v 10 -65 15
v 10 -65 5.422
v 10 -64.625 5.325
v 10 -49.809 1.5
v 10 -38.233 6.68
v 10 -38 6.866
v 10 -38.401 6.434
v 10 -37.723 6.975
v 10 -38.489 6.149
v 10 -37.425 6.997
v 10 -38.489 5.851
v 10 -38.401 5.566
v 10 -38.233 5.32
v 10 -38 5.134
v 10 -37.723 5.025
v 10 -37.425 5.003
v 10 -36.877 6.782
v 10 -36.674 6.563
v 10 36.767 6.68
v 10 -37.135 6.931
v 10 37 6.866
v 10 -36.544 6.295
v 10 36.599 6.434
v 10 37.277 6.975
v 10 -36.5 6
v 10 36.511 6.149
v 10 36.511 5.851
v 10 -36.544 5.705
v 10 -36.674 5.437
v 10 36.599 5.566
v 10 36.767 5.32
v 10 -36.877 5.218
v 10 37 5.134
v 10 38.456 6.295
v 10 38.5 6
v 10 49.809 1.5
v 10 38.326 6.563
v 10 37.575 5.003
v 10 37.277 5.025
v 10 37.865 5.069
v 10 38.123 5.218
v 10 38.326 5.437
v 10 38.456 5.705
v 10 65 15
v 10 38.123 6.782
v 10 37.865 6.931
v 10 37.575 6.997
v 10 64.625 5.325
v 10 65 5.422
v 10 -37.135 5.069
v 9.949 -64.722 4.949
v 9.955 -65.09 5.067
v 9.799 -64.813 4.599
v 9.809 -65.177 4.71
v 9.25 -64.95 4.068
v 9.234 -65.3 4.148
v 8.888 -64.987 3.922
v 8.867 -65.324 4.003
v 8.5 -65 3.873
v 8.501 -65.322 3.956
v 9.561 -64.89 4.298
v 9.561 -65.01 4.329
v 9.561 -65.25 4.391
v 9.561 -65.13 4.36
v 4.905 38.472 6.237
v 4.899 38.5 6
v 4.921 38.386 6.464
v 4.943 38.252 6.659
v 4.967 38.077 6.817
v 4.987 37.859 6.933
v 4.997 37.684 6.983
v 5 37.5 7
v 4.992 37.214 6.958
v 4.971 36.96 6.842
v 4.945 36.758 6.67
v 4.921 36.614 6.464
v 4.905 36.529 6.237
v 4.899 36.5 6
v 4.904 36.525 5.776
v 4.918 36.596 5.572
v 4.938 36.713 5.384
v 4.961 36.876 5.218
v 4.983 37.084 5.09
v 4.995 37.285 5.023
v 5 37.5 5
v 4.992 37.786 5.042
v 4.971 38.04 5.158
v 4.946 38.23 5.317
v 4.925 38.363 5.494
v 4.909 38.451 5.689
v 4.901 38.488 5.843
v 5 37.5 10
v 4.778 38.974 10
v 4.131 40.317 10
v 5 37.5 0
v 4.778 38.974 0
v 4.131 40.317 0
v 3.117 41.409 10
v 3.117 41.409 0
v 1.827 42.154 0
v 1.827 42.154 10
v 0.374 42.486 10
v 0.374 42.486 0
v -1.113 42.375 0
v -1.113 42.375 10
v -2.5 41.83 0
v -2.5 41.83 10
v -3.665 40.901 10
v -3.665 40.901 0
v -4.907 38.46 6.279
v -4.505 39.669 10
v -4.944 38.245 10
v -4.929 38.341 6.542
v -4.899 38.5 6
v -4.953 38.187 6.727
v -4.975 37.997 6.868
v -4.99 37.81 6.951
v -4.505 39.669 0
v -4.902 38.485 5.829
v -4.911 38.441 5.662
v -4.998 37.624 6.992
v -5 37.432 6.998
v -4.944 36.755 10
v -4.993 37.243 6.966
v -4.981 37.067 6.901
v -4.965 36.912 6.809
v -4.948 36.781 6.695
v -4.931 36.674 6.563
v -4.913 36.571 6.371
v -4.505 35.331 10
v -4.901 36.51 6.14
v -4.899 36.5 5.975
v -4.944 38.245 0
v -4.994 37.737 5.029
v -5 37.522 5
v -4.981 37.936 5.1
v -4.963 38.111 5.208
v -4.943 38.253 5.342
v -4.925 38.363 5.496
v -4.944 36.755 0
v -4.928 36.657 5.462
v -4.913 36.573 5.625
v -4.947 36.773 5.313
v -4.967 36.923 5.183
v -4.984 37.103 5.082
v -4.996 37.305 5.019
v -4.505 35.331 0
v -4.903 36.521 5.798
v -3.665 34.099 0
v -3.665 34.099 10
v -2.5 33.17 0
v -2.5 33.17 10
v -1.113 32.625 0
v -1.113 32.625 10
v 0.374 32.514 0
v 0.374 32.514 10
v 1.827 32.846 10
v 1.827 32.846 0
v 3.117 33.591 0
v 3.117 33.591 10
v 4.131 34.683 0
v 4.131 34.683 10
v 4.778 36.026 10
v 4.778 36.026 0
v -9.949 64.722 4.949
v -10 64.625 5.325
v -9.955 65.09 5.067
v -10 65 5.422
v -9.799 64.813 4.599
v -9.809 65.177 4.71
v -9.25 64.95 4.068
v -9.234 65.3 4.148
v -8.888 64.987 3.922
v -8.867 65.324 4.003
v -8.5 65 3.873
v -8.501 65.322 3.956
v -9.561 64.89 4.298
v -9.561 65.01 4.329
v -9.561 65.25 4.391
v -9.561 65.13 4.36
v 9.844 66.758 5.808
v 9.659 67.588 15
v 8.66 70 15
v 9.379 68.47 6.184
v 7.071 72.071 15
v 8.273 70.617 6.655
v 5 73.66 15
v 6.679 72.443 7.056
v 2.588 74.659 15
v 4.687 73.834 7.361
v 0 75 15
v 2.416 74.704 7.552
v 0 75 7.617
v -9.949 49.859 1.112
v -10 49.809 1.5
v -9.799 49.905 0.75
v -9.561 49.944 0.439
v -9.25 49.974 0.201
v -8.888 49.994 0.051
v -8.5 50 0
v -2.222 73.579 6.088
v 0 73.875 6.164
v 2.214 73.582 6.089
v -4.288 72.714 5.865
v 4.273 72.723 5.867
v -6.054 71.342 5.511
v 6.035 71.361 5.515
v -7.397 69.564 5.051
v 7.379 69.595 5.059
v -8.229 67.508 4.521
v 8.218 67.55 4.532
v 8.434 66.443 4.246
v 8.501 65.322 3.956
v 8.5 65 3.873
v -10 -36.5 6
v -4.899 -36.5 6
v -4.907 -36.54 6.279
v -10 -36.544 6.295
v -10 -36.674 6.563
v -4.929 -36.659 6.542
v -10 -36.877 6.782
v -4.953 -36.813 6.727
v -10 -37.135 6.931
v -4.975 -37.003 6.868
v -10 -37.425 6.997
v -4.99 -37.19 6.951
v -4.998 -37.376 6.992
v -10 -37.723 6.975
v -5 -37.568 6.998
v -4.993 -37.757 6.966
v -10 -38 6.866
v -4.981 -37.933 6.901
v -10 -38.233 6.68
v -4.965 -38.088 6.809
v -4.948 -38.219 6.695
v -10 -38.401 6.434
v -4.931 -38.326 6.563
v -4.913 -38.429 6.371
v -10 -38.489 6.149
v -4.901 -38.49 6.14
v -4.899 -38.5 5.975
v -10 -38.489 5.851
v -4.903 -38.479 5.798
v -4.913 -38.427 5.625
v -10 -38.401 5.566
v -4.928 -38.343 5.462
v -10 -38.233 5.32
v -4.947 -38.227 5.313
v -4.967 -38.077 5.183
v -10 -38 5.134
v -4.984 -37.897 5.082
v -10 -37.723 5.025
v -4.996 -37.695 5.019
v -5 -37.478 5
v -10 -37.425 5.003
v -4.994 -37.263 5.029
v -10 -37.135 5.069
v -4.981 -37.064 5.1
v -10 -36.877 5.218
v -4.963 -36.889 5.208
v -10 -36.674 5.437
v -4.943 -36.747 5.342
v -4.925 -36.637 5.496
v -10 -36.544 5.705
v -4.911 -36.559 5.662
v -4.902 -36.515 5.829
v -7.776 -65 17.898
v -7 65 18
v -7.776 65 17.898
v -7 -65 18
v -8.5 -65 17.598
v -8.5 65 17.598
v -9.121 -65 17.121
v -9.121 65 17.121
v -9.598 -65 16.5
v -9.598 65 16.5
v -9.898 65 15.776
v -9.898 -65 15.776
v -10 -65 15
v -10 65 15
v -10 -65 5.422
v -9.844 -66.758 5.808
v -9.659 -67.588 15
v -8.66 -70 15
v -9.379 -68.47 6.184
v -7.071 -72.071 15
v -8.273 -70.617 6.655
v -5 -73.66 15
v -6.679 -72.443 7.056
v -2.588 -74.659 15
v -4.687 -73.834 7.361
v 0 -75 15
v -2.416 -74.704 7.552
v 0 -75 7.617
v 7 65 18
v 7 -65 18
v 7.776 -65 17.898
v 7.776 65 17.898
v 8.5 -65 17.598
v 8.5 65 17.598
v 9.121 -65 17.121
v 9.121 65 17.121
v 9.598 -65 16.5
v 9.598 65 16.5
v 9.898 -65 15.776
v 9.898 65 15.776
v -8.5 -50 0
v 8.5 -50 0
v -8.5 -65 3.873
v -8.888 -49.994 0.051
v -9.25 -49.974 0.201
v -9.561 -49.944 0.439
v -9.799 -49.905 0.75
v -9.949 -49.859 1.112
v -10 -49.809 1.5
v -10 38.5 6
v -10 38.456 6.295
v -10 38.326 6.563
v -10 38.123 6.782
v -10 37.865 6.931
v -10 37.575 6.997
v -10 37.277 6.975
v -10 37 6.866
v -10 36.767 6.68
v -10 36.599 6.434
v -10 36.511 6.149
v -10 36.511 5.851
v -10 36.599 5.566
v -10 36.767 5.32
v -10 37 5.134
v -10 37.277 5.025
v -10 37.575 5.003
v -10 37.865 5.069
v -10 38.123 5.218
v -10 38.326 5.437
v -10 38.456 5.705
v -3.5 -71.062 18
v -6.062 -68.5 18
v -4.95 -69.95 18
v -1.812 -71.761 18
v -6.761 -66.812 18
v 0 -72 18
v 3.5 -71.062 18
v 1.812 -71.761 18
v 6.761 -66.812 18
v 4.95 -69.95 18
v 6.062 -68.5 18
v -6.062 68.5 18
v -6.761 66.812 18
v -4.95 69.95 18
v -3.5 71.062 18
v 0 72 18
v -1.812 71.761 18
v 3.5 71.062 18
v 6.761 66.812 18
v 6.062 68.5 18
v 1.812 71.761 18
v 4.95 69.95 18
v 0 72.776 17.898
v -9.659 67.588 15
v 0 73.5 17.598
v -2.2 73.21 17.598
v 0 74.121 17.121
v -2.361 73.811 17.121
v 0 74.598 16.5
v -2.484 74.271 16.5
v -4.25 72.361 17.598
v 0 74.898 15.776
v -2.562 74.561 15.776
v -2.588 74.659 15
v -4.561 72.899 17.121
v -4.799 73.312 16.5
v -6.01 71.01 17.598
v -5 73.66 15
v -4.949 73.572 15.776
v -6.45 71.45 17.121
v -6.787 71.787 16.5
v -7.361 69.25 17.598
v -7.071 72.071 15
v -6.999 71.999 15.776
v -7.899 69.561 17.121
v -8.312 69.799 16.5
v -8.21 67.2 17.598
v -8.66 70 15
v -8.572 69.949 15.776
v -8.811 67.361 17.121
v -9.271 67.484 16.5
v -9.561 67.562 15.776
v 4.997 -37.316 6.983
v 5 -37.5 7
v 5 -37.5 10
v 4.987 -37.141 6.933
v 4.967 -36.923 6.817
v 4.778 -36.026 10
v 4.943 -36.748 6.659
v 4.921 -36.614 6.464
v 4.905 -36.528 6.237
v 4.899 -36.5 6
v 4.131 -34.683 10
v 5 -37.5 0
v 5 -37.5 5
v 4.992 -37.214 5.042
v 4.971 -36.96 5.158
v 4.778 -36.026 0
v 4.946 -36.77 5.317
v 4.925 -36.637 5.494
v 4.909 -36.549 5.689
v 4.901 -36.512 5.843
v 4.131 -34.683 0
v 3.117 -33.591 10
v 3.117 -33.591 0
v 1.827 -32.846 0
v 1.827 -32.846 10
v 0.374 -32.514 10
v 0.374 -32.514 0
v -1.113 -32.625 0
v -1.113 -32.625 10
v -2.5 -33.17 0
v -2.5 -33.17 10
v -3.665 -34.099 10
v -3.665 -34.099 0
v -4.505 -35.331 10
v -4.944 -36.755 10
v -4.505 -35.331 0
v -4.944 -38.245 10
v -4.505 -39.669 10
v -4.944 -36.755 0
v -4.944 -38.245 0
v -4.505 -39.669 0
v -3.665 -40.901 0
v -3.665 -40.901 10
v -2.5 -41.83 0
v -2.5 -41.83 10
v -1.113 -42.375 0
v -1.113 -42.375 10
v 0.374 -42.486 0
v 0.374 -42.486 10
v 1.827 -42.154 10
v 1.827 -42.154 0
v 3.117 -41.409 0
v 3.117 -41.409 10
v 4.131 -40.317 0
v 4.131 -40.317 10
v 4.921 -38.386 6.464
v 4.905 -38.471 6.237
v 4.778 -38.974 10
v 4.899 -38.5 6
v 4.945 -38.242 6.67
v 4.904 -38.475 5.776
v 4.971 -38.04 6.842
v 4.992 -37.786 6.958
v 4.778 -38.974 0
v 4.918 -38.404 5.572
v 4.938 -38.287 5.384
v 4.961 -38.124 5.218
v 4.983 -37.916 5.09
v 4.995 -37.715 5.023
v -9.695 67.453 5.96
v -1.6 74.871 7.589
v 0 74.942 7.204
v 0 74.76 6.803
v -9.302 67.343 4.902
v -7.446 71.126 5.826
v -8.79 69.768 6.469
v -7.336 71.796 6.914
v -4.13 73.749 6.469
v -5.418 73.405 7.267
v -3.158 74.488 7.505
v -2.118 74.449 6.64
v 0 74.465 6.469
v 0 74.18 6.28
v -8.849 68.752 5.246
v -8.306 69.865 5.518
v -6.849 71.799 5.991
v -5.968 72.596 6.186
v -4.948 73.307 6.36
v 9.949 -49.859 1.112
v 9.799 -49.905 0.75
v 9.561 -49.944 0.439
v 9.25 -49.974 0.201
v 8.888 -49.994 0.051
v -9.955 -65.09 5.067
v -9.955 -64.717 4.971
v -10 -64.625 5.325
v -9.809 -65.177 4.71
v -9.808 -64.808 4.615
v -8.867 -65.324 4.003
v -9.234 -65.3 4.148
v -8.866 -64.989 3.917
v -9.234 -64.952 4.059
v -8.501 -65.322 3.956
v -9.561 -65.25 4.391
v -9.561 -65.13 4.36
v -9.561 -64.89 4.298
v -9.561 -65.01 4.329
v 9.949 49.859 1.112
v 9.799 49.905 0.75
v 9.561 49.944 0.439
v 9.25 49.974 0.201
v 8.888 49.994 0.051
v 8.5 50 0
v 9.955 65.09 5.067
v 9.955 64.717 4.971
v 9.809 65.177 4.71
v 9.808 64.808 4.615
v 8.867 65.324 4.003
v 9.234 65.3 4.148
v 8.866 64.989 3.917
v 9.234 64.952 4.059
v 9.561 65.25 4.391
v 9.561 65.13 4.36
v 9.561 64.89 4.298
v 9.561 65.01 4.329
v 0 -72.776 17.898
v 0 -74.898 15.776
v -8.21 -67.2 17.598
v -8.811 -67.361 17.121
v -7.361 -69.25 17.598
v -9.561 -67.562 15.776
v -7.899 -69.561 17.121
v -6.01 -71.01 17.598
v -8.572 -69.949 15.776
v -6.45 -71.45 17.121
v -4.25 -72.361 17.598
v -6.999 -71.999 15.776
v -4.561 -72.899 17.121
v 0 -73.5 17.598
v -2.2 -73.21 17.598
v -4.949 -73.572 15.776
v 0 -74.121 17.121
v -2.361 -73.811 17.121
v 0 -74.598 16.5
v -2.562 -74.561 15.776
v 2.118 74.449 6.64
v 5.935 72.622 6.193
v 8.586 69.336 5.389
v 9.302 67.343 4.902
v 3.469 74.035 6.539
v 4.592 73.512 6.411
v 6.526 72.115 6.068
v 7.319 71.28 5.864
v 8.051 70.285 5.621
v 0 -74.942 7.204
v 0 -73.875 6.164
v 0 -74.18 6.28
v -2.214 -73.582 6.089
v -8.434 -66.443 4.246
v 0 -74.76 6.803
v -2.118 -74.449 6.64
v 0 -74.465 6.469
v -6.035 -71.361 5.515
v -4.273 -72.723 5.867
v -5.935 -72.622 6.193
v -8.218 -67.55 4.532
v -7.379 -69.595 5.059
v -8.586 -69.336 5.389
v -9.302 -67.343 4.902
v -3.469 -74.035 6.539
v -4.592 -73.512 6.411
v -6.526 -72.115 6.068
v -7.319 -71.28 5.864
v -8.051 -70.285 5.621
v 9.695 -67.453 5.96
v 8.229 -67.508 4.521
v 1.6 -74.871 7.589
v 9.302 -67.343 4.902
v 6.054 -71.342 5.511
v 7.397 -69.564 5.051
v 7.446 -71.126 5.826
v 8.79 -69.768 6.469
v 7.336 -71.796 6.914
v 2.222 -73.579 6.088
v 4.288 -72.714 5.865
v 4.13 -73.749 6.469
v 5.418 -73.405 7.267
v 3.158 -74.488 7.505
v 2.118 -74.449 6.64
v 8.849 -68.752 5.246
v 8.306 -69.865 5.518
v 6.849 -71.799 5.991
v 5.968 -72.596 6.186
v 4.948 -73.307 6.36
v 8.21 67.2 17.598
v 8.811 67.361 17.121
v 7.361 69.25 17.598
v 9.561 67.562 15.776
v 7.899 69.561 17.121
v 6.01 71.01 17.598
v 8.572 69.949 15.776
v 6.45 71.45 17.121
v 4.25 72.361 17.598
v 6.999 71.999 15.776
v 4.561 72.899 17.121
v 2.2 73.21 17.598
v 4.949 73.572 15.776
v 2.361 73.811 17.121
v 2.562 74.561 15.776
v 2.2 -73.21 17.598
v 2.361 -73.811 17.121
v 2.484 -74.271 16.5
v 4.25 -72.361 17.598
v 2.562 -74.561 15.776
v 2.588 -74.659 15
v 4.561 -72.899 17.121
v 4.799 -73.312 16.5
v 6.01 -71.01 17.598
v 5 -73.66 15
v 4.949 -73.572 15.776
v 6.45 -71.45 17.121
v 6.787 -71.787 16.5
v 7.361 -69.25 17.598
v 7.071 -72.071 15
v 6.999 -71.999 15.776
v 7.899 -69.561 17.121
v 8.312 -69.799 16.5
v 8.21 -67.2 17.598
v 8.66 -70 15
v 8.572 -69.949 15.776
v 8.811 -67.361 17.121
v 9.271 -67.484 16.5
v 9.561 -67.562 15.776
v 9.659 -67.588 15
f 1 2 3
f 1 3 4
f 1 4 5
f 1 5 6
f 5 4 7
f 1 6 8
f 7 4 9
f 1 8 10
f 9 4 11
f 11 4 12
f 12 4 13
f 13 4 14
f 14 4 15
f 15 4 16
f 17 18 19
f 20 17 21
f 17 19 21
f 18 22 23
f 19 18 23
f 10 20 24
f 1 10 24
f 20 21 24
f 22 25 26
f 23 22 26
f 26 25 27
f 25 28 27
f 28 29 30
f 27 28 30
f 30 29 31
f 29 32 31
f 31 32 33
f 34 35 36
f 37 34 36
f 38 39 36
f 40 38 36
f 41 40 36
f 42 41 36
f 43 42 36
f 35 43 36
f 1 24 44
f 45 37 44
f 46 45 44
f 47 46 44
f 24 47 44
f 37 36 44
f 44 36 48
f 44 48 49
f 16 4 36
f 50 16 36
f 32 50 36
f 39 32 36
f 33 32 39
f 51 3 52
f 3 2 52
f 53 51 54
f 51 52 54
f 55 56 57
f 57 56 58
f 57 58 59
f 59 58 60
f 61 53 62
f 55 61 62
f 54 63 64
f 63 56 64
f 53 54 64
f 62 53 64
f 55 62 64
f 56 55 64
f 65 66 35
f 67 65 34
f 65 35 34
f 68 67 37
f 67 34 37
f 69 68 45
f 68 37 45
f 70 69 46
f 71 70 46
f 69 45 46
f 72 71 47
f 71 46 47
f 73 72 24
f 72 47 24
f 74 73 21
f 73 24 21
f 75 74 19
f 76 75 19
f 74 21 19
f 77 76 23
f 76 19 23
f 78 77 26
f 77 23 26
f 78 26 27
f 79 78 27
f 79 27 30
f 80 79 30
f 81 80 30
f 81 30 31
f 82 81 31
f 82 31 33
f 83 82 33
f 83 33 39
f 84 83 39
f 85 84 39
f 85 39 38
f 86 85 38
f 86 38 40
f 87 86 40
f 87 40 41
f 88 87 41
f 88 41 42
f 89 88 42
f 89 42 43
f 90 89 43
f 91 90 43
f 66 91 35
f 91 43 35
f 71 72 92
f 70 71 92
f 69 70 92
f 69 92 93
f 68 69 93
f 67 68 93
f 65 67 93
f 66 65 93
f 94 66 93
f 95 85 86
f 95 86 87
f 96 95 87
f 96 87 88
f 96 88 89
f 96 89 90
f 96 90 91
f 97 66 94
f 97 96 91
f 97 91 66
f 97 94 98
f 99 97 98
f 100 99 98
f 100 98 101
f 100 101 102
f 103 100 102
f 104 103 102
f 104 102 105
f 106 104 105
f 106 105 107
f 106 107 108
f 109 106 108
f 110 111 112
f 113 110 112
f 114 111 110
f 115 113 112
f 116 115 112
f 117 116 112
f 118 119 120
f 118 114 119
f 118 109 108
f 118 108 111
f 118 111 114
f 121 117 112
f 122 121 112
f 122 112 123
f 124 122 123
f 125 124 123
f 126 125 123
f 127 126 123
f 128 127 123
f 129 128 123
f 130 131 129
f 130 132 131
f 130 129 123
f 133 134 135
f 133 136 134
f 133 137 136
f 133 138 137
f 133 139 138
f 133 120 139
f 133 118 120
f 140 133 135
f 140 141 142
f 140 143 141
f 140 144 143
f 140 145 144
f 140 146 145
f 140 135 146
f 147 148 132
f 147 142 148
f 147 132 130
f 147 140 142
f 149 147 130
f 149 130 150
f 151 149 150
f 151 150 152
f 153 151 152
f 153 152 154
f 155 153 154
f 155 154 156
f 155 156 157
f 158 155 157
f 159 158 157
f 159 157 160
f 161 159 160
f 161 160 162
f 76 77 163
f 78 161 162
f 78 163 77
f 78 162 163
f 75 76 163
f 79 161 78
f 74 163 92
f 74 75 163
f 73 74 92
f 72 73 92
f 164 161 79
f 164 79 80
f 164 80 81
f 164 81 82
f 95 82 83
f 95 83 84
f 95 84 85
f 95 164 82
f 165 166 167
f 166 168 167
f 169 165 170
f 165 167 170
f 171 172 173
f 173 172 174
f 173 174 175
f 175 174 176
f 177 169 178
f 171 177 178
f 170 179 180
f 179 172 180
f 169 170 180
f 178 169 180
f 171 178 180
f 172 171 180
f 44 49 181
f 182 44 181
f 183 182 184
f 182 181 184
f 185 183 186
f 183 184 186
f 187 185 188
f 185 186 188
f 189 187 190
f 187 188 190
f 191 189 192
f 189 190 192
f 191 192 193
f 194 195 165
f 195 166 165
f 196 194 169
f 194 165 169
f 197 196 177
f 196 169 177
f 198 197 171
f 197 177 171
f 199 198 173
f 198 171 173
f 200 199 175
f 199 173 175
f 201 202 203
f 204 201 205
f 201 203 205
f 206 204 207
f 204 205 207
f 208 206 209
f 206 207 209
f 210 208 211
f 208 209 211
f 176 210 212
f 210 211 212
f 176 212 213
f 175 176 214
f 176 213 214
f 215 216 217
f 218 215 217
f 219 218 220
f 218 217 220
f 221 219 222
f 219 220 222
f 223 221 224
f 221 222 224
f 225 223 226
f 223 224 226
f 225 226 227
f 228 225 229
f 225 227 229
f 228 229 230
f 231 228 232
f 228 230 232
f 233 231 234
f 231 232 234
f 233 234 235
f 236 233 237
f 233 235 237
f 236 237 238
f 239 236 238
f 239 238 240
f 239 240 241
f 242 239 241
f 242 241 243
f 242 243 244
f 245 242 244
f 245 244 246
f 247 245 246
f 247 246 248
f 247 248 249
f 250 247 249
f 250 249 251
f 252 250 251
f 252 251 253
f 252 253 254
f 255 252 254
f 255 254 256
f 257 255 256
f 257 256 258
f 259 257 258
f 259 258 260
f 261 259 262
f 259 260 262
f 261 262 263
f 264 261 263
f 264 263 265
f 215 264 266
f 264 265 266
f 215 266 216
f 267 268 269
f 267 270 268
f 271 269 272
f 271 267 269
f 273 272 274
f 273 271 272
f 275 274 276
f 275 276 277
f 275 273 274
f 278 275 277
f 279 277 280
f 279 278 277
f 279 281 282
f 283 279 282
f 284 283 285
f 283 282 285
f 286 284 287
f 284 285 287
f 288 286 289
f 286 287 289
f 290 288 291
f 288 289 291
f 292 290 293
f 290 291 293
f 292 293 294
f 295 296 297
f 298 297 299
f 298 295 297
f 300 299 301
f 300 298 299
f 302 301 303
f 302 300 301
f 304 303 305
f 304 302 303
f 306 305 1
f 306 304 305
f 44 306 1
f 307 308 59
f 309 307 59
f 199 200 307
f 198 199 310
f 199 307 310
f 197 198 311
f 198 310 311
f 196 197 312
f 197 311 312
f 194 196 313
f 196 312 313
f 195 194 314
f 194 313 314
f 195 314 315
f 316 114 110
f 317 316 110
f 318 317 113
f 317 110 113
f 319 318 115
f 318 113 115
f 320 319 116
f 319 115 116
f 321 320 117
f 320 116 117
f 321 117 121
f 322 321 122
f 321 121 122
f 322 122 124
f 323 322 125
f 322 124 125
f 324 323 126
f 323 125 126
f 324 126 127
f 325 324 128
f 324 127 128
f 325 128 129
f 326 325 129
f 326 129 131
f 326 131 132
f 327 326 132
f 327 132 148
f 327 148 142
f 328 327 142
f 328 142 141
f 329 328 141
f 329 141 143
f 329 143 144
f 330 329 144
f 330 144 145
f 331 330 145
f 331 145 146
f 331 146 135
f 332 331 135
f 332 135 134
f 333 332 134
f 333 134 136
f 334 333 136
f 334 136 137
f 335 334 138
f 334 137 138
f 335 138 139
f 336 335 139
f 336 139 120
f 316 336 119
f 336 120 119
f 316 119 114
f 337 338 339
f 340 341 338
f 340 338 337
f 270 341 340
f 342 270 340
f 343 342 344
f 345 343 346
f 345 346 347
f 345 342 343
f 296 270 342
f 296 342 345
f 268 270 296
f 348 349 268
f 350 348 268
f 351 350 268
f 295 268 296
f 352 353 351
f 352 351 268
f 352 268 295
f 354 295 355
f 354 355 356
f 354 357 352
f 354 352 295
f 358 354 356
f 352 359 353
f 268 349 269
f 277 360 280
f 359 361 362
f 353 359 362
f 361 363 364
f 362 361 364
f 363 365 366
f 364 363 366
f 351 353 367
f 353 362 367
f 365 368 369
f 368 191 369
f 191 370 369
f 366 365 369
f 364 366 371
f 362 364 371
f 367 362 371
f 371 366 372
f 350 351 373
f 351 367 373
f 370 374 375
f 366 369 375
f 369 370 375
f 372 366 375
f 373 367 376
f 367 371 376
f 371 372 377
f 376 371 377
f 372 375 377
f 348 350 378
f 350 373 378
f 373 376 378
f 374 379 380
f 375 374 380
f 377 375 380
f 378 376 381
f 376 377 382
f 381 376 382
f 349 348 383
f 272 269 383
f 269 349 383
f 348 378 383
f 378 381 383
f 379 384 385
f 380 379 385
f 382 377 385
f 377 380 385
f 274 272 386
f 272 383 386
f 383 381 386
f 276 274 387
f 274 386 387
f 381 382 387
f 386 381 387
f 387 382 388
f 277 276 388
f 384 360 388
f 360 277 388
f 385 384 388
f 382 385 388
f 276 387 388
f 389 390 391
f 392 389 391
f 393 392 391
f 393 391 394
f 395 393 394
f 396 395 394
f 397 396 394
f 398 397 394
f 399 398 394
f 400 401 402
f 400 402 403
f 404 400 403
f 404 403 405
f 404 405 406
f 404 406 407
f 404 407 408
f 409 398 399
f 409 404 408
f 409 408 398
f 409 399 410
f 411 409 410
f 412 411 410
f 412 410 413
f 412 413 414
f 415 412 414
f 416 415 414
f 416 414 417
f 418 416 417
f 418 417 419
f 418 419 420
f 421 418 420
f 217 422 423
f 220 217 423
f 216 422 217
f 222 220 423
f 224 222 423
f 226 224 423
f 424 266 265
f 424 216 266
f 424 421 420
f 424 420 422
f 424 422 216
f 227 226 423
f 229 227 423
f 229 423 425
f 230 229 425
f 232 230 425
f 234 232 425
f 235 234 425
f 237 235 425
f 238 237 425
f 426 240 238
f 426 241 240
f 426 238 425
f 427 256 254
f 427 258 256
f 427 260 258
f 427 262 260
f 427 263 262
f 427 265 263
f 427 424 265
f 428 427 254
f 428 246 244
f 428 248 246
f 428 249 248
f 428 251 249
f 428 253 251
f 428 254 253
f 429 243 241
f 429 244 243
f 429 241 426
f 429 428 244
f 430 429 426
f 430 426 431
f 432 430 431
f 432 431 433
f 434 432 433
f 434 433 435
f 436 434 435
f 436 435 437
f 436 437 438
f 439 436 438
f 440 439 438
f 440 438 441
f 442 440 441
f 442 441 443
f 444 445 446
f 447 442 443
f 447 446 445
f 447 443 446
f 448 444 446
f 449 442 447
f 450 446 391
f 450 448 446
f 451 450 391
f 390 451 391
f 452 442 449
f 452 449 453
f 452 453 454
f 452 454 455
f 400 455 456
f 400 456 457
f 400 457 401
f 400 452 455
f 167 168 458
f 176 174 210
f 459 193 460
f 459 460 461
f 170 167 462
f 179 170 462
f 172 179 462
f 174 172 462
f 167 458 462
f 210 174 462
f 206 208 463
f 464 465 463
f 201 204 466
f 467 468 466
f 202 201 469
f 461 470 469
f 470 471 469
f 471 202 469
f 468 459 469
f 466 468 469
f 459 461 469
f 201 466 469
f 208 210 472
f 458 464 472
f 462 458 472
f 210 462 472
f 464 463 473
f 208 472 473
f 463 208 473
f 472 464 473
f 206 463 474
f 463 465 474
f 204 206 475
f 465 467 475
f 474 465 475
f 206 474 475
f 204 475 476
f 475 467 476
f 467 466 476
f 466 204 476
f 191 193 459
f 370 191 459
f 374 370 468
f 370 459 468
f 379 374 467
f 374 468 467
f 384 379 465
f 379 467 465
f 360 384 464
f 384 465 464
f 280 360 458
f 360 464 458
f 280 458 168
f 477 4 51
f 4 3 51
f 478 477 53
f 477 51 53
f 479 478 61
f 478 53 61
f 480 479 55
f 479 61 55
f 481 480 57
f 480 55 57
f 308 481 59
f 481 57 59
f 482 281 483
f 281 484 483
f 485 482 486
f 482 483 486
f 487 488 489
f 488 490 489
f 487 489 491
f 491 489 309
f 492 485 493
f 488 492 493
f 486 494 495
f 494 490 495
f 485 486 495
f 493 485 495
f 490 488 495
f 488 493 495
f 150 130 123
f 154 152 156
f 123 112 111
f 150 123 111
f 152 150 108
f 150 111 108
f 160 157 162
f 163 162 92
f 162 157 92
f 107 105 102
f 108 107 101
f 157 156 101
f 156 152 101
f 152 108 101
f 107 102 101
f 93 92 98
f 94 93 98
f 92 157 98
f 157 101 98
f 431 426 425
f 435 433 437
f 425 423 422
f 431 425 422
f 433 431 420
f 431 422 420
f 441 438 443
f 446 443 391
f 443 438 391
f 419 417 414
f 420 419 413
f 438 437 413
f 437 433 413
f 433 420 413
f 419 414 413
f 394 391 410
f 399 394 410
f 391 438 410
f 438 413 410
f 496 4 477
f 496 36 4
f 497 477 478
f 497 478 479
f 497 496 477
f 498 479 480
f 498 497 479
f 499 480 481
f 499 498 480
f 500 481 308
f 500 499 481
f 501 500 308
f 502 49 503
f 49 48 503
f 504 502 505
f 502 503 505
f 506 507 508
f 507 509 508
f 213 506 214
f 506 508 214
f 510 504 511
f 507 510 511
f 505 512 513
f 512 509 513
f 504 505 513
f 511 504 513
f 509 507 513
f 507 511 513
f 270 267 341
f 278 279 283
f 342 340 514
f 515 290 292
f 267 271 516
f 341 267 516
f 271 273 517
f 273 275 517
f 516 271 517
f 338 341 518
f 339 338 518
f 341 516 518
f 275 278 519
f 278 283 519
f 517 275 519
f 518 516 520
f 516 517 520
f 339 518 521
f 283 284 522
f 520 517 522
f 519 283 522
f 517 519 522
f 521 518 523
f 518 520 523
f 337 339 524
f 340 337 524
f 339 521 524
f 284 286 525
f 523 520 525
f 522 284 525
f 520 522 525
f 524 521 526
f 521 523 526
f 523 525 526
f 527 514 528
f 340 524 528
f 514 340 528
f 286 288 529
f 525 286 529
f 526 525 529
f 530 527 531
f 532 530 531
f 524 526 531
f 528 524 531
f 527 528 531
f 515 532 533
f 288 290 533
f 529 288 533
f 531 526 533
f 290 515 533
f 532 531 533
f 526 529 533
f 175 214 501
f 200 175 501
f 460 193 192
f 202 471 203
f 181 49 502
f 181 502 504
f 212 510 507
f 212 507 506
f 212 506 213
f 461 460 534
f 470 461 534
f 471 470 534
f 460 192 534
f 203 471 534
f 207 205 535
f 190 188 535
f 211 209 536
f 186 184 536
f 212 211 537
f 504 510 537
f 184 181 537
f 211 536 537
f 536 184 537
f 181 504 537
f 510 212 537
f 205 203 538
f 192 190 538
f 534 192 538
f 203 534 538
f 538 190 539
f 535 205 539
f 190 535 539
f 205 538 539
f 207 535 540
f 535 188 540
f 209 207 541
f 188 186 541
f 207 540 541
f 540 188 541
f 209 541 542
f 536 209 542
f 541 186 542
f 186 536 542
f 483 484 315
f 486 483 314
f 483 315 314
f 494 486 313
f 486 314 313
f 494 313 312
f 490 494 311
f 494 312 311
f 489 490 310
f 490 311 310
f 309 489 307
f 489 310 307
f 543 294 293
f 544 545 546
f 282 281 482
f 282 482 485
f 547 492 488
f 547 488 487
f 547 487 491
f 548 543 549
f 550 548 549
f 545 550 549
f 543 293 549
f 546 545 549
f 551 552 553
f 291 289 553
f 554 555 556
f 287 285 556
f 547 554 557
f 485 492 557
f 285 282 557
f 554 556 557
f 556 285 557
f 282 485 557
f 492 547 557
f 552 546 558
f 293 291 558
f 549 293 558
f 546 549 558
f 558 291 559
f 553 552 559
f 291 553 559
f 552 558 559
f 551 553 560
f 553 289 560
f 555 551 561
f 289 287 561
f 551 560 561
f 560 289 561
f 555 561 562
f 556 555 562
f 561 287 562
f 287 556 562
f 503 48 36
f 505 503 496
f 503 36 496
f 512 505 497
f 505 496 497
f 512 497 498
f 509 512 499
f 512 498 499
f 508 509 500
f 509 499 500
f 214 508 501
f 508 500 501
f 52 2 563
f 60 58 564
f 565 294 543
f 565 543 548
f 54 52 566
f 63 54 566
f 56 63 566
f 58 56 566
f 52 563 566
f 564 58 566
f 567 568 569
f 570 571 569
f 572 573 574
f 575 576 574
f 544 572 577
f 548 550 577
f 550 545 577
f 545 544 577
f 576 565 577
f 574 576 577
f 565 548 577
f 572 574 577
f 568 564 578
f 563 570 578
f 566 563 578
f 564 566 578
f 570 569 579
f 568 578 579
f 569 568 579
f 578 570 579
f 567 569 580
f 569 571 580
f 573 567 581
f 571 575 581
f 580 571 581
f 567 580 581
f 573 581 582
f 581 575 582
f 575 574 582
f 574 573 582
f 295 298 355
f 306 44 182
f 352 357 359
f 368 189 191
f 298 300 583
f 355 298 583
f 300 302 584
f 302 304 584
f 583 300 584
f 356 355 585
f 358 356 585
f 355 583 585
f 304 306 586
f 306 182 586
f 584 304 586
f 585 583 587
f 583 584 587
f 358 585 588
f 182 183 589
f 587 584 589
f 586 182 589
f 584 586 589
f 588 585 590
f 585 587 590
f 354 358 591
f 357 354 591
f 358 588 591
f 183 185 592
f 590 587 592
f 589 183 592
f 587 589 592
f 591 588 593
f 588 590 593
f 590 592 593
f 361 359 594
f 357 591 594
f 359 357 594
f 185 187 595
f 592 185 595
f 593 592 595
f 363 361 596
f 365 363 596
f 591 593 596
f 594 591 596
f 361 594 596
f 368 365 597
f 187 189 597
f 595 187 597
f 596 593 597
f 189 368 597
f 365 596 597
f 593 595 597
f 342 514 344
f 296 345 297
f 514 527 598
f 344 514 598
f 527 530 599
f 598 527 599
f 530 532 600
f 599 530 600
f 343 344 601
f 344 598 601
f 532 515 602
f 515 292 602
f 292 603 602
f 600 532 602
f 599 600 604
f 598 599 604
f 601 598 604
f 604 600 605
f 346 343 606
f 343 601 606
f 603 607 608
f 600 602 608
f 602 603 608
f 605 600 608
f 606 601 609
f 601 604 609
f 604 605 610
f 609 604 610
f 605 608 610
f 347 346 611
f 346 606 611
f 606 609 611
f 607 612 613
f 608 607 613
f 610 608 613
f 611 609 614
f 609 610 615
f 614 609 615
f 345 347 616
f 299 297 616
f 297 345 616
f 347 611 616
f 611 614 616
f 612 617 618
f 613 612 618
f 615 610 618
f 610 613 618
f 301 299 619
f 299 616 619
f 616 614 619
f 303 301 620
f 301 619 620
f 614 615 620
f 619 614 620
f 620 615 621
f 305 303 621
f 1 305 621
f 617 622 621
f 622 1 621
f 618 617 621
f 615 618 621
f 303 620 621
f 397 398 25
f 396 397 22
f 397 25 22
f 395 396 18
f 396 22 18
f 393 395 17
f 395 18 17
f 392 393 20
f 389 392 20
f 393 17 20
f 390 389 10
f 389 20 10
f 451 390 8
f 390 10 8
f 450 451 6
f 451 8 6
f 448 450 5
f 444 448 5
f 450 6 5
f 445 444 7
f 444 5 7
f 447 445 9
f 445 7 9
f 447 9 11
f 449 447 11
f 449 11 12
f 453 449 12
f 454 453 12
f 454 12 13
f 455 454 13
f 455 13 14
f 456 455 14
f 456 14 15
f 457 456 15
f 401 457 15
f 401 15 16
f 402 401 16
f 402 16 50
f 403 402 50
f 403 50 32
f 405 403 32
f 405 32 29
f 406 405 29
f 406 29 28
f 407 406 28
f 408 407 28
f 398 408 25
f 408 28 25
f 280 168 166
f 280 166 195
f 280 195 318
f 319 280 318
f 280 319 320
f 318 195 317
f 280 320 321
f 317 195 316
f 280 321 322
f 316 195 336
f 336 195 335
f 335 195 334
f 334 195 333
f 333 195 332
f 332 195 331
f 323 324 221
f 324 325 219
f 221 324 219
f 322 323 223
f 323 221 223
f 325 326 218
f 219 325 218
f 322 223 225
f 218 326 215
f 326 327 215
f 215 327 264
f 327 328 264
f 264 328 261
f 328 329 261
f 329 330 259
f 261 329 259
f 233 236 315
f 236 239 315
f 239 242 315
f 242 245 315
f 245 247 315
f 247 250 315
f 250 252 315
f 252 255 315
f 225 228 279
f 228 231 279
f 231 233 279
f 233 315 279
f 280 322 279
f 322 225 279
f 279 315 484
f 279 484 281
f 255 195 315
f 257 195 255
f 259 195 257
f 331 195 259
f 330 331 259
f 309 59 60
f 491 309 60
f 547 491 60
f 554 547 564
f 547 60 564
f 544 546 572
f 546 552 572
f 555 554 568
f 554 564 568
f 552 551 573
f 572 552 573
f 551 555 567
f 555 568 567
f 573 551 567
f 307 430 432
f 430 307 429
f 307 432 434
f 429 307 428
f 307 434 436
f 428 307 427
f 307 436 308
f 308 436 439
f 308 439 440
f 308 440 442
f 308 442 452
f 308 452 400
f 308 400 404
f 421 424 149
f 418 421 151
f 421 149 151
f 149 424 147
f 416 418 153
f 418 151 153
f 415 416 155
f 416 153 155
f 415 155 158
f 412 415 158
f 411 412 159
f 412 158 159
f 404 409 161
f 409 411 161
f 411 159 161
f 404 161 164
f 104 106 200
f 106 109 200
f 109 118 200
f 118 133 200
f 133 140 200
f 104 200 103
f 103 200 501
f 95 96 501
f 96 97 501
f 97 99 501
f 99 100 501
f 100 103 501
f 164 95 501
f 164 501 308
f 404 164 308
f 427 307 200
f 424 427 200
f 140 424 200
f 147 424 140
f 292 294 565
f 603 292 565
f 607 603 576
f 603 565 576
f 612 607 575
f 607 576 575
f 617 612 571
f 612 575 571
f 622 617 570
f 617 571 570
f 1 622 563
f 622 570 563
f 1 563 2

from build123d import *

# Parameters (mm, degrees)
F0_R     = 5
F1_DEPTH = 18
F2_DEPTH = 10
F4_DEPTH = 20.001
F5_R     = 1.5
F6_R     = 3
F7_R     = 1
F8_DEPTH = 20.001


with BuildPart() as f1:
    # F0 (on Top) → F1 (new body)
    with BuildSketch(Plane.XY):
        with BuildLine():
            ThreePointArc((0, -75), (7.071068, -72.071068), (10, -65))
            Line((10, -65), (10, 65))
            ThreePointArc((10, 65), (7.071068, 72.071068), (0, 75))
            ThreePointArc((0, 75), (-7.071068, 72.071068), (-10, 65))
            Line((-10, 65), (-10, -65))
            ThreePointArc((-10, -65), (-7.071068, -72.071068), (0, -75))
        make_face()
        with Locations((0, -37.5)):
            Circle(F0_R, mode=Mode.SUBTRACT)
        with Locations((0, 37.5)):
            Circle(F0_R, mode=Mode.SUBTRACT)
        with Locations((0, -37.5)):
            Circle(F0_R)
        with Locations((0, 37.5)):
            Circle(F0_R)
    extrude(amount=F1_DEPTH)

    # F0 (on Top) → F2 (cut)
    with BuildSketch(Plane.XY):
        with Locations((0, -37.5)):
            Circle(F0_R)
        with Locations((0, 37.5)):
            Circle(F0_R)
    extrude(amount=F2_DEPTH, mode=Mode.SUBTRACT)

    # F3 (on face) → F4 (cut, through all)
    with BuildSketch(Plane.YZ.offset(10)):
        Polygon((-65, 0), (-65, 3.872983), (-88.729833, 10), (-88.729833, 0), align=None)
        Polygon((-65, 0), (-50, 0), (-65, 3.872983), align=None)
        Polygon((65, 3.872983), (65, 0), (88.729833, 0), (88.729833, 10), align=None)
        Polygon((65, 3.872983), (50, 0), (65, 0), align=None)
    extrude(amount=-F4_DEPTH, mode=Mode.SUBTRACT)

    # F5
    f5_edges = [f1.edges().sort_by_distance(p)[0] for p in [
        (10, -57.5, 1.936492),
        (10, 57.5, 1.936492),
        (10, 0, 0),
        (-10, 0, 0),
    ]]
    fillet(f5_edges, radius=F5_R)

    # F6
    f6_edges = [f1.edges().sort_by_distance(p)[0] for p in [
        (-10, 0, 18),
    ]]
    fillet(f6_edges, radius=F6_R)

    # F7 (on face) → F8 (cut, through all)
    with BuildSketch(Plane.YZ.offset(10)):
        with Locations((-37.5, 6)):
            Circle(F7_R)
        with Locations((37.5, 6)):
            Circle(F7_R)
    extrude(amount=-F8_DEPTH, mode=Mode.SUBTRACT)


solid = f1.part
